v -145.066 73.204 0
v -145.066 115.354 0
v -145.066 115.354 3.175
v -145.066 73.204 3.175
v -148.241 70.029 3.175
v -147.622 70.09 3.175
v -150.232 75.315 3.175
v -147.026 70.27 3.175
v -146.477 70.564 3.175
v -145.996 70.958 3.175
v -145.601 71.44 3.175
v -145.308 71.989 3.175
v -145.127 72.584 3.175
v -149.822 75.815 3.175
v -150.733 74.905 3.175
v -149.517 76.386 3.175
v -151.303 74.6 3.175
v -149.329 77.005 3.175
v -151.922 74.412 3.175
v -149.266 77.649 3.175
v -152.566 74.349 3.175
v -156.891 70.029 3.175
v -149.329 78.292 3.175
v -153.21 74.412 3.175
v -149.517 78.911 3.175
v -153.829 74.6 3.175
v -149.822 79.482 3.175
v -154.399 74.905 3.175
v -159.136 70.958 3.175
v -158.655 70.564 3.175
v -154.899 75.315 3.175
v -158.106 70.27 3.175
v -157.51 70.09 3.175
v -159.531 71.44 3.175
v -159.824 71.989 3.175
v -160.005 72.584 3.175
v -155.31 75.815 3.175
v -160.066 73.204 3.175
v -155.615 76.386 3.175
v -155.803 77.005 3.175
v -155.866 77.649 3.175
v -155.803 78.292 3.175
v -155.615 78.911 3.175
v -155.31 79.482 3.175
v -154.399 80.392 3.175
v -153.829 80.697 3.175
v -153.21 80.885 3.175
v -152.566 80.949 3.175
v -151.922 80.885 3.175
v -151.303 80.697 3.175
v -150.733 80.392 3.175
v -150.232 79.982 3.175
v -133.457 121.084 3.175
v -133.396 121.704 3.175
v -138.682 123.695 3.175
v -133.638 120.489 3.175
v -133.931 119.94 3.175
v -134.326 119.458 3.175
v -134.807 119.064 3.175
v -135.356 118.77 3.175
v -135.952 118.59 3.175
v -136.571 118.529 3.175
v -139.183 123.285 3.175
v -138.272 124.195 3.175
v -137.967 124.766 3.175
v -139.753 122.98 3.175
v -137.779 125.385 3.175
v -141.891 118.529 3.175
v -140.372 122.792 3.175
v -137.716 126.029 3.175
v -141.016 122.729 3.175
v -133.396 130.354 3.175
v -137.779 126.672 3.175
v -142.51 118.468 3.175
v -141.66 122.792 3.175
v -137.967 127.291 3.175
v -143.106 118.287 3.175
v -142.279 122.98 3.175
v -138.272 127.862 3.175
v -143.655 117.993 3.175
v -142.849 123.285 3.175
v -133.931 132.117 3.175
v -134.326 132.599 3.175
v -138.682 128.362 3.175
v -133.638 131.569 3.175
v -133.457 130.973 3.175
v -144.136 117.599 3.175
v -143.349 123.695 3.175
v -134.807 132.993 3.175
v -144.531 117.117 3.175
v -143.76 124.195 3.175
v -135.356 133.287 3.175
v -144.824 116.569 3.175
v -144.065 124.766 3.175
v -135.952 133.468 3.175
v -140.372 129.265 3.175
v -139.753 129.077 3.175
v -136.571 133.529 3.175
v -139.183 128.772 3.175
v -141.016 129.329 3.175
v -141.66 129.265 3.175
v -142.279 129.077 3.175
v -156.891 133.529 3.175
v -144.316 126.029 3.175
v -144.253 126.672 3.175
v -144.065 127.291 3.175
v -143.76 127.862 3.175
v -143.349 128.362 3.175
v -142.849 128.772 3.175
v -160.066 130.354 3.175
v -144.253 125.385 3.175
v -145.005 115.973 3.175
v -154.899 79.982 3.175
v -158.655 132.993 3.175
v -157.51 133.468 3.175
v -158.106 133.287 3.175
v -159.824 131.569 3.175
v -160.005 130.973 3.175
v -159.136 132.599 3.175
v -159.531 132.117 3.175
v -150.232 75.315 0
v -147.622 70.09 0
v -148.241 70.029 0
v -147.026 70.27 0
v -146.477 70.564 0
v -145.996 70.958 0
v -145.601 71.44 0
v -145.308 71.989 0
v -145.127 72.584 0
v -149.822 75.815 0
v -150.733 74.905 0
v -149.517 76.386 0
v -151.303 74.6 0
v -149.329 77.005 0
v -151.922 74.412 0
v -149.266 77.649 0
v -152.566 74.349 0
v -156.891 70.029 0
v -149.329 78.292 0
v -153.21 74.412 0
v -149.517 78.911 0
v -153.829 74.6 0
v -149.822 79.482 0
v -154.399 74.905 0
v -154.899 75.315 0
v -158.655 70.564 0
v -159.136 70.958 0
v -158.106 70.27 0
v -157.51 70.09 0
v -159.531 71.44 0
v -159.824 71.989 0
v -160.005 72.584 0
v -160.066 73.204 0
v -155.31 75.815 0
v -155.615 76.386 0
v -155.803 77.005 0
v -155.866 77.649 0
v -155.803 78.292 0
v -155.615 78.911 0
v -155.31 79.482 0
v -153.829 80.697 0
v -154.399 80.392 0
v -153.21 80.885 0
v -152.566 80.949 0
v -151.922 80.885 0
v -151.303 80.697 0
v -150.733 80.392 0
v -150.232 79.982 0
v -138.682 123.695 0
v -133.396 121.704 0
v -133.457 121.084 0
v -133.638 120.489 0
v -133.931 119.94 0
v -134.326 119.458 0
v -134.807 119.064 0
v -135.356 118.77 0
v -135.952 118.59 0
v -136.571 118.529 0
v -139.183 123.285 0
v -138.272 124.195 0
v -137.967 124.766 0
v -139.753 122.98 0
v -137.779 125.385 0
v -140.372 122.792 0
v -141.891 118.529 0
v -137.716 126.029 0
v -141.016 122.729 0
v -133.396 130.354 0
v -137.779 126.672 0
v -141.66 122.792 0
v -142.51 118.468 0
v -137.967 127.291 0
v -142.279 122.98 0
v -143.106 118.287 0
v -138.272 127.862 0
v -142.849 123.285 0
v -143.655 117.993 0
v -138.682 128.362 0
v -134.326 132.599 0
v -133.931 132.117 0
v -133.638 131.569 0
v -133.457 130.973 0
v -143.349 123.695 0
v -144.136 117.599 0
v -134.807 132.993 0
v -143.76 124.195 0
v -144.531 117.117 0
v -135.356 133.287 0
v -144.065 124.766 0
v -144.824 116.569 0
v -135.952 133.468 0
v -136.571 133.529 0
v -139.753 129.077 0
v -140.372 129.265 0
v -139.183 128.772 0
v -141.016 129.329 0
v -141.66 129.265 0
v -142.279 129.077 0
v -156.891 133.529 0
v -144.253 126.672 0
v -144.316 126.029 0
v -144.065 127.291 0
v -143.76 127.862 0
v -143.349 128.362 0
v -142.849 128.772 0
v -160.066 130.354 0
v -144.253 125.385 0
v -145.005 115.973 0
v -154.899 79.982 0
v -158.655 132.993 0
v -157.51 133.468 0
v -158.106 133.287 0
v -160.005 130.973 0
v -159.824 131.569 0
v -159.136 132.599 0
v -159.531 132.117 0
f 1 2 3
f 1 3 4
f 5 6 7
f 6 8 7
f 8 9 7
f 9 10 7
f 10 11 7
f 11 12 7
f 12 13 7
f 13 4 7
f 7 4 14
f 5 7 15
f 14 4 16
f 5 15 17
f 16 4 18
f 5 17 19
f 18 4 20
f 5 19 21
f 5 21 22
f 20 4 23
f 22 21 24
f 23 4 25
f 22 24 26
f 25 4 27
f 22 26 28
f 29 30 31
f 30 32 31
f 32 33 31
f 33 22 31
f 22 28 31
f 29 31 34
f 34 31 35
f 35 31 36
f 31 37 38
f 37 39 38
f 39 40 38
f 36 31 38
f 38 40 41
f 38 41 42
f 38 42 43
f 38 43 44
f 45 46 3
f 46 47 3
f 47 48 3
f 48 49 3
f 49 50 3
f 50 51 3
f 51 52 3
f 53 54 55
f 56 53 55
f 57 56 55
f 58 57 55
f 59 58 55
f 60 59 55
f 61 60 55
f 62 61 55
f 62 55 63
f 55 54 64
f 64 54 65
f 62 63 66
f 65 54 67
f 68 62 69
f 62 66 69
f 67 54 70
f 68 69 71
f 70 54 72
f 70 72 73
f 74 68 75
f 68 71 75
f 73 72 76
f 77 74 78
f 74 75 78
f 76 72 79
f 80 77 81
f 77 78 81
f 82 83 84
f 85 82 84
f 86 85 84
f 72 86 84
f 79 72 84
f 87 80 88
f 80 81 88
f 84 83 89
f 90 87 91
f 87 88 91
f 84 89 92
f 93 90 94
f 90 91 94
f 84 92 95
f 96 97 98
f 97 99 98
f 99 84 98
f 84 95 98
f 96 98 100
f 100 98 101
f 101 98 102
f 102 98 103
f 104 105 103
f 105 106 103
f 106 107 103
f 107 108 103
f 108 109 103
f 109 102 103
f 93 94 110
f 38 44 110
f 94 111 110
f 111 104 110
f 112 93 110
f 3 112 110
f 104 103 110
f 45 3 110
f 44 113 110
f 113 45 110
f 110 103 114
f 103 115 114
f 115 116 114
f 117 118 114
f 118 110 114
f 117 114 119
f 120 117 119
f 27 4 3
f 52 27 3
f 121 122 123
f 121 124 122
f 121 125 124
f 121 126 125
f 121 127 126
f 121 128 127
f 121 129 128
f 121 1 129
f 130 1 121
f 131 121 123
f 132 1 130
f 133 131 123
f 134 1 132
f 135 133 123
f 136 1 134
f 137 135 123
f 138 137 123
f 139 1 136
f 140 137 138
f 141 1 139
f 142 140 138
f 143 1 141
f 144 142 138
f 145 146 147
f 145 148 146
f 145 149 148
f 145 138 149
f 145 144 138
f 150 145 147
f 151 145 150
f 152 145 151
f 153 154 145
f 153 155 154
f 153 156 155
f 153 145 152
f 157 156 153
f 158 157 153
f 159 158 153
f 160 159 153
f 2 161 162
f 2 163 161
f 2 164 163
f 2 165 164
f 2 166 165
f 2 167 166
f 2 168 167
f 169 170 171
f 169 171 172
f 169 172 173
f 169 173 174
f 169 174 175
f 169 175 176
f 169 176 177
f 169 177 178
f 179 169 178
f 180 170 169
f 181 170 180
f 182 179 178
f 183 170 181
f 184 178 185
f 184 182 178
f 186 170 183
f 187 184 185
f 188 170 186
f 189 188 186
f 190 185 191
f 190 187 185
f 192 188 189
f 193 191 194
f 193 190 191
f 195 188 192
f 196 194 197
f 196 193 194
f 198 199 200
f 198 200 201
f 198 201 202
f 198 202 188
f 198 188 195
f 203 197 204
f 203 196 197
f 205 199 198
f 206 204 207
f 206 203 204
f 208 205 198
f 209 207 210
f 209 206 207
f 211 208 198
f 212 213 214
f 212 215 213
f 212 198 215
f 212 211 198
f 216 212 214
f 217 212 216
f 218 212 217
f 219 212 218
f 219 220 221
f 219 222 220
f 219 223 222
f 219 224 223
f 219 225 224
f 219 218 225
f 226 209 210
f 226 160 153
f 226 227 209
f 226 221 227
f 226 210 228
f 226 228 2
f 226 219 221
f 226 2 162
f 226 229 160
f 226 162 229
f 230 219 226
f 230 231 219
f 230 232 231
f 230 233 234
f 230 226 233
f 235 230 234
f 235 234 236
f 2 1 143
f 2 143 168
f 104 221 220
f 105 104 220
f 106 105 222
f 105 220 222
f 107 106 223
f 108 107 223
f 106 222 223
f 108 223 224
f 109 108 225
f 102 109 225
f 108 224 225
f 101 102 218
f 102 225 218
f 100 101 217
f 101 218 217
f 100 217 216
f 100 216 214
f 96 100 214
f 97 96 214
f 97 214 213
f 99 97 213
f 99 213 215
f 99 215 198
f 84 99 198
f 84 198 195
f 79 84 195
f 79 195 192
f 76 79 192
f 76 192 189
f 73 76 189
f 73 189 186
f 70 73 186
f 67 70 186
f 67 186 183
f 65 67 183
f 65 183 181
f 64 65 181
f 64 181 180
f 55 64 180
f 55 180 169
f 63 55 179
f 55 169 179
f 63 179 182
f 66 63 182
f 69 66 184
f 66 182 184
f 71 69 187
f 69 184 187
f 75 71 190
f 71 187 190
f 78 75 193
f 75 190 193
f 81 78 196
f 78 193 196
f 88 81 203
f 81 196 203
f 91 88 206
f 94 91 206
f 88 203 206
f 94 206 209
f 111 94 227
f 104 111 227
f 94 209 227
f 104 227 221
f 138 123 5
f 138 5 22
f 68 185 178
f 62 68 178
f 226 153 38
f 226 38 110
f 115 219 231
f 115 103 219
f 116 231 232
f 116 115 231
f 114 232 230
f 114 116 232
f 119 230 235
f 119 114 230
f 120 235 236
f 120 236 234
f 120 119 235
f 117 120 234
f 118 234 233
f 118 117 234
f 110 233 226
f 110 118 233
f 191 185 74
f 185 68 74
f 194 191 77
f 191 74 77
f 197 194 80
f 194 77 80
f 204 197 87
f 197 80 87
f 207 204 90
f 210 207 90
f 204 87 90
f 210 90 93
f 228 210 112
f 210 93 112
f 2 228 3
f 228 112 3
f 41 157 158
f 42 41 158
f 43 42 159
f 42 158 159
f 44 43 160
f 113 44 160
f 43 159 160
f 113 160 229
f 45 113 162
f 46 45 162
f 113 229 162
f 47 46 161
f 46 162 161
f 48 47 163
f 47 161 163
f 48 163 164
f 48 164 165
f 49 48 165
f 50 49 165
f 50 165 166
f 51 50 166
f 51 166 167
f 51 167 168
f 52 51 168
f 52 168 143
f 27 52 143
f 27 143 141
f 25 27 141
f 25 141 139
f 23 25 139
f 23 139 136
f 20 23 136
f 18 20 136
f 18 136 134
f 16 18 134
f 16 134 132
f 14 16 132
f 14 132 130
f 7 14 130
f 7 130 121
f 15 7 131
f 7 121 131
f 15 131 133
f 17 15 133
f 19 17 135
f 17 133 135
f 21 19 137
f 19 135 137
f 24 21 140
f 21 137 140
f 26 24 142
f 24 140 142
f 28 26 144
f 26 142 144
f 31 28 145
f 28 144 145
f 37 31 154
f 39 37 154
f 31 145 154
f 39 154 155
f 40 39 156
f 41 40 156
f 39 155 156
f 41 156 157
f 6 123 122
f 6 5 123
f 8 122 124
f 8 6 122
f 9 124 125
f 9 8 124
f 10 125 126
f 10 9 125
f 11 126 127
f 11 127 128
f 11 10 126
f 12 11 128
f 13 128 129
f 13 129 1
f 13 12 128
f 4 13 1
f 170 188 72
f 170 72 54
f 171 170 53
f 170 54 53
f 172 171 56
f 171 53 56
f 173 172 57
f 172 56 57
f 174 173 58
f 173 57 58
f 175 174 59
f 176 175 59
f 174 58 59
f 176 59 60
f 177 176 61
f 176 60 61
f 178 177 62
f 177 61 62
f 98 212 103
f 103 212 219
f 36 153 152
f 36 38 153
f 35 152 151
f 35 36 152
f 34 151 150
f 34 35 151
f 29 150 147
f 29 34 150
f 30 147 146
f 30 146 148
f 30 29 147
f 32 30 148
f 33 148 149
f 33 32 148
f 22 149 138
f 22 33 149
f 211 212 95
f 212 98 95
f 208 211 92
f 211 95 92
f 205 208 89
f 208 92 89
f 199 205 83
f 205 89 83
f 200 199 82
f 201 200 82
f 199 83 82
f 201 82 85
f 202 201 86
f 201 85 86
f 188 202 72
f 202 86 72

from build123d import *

# Parameters (mm, degrees)
BOSS_EXTRUDE1_DEPTH  = 3.175
M6_CLEARANCE_HOLE1_D = 6.6
FILLET1_R            = 3.175


with BuildPart() as part:
    # Sketch1 → Boss-Extrude1 (new body)
    with BuildSketch(Plane.XY):
        Polygon((-141.015921324, 133.528527902), (-133.395921324, 133.528527902), (-133.395921324, 118.528527902), (-141.015921324, 118.528527902), (-145.065921324, 118.528527902), (-145.065921324, 70.028527902), (-160.065921324, 70.028527902), (-160.065921324, 133.528527902), align=None)
    extrude(amount=BOSS_EXTRUDE1_DEPTH)

    # M6 Clearance Hole1 (through all)
    with Locations(Plane.XY.offset(3.175)):
        with Locations((-141.015921324, 126.028527902), (-152.565921324, 77.648527902)):
            Hole(M6_CLEARANCE_HOLE1_D / 2)

    # Fillet1
    fillet1_edges = [part.edges().sort_by_distance(p)[0] for p in [
        (-145.065921324, 118.528527902, 1.5875),
        (-145.065921324, 70.028527902, 1.5875),
        (-160.065921324, 70.028527902, 1.5875),
        (-160.065921324, 133.528527902, 1.5875),
        (-133.395921324, 133.528527902, 1.5875),
        (-133.395921324, 118.528527902, 1.5875),
    ]]
    fillet(fillet1_edges, radius=FILLET1_R)


solid = part.part
